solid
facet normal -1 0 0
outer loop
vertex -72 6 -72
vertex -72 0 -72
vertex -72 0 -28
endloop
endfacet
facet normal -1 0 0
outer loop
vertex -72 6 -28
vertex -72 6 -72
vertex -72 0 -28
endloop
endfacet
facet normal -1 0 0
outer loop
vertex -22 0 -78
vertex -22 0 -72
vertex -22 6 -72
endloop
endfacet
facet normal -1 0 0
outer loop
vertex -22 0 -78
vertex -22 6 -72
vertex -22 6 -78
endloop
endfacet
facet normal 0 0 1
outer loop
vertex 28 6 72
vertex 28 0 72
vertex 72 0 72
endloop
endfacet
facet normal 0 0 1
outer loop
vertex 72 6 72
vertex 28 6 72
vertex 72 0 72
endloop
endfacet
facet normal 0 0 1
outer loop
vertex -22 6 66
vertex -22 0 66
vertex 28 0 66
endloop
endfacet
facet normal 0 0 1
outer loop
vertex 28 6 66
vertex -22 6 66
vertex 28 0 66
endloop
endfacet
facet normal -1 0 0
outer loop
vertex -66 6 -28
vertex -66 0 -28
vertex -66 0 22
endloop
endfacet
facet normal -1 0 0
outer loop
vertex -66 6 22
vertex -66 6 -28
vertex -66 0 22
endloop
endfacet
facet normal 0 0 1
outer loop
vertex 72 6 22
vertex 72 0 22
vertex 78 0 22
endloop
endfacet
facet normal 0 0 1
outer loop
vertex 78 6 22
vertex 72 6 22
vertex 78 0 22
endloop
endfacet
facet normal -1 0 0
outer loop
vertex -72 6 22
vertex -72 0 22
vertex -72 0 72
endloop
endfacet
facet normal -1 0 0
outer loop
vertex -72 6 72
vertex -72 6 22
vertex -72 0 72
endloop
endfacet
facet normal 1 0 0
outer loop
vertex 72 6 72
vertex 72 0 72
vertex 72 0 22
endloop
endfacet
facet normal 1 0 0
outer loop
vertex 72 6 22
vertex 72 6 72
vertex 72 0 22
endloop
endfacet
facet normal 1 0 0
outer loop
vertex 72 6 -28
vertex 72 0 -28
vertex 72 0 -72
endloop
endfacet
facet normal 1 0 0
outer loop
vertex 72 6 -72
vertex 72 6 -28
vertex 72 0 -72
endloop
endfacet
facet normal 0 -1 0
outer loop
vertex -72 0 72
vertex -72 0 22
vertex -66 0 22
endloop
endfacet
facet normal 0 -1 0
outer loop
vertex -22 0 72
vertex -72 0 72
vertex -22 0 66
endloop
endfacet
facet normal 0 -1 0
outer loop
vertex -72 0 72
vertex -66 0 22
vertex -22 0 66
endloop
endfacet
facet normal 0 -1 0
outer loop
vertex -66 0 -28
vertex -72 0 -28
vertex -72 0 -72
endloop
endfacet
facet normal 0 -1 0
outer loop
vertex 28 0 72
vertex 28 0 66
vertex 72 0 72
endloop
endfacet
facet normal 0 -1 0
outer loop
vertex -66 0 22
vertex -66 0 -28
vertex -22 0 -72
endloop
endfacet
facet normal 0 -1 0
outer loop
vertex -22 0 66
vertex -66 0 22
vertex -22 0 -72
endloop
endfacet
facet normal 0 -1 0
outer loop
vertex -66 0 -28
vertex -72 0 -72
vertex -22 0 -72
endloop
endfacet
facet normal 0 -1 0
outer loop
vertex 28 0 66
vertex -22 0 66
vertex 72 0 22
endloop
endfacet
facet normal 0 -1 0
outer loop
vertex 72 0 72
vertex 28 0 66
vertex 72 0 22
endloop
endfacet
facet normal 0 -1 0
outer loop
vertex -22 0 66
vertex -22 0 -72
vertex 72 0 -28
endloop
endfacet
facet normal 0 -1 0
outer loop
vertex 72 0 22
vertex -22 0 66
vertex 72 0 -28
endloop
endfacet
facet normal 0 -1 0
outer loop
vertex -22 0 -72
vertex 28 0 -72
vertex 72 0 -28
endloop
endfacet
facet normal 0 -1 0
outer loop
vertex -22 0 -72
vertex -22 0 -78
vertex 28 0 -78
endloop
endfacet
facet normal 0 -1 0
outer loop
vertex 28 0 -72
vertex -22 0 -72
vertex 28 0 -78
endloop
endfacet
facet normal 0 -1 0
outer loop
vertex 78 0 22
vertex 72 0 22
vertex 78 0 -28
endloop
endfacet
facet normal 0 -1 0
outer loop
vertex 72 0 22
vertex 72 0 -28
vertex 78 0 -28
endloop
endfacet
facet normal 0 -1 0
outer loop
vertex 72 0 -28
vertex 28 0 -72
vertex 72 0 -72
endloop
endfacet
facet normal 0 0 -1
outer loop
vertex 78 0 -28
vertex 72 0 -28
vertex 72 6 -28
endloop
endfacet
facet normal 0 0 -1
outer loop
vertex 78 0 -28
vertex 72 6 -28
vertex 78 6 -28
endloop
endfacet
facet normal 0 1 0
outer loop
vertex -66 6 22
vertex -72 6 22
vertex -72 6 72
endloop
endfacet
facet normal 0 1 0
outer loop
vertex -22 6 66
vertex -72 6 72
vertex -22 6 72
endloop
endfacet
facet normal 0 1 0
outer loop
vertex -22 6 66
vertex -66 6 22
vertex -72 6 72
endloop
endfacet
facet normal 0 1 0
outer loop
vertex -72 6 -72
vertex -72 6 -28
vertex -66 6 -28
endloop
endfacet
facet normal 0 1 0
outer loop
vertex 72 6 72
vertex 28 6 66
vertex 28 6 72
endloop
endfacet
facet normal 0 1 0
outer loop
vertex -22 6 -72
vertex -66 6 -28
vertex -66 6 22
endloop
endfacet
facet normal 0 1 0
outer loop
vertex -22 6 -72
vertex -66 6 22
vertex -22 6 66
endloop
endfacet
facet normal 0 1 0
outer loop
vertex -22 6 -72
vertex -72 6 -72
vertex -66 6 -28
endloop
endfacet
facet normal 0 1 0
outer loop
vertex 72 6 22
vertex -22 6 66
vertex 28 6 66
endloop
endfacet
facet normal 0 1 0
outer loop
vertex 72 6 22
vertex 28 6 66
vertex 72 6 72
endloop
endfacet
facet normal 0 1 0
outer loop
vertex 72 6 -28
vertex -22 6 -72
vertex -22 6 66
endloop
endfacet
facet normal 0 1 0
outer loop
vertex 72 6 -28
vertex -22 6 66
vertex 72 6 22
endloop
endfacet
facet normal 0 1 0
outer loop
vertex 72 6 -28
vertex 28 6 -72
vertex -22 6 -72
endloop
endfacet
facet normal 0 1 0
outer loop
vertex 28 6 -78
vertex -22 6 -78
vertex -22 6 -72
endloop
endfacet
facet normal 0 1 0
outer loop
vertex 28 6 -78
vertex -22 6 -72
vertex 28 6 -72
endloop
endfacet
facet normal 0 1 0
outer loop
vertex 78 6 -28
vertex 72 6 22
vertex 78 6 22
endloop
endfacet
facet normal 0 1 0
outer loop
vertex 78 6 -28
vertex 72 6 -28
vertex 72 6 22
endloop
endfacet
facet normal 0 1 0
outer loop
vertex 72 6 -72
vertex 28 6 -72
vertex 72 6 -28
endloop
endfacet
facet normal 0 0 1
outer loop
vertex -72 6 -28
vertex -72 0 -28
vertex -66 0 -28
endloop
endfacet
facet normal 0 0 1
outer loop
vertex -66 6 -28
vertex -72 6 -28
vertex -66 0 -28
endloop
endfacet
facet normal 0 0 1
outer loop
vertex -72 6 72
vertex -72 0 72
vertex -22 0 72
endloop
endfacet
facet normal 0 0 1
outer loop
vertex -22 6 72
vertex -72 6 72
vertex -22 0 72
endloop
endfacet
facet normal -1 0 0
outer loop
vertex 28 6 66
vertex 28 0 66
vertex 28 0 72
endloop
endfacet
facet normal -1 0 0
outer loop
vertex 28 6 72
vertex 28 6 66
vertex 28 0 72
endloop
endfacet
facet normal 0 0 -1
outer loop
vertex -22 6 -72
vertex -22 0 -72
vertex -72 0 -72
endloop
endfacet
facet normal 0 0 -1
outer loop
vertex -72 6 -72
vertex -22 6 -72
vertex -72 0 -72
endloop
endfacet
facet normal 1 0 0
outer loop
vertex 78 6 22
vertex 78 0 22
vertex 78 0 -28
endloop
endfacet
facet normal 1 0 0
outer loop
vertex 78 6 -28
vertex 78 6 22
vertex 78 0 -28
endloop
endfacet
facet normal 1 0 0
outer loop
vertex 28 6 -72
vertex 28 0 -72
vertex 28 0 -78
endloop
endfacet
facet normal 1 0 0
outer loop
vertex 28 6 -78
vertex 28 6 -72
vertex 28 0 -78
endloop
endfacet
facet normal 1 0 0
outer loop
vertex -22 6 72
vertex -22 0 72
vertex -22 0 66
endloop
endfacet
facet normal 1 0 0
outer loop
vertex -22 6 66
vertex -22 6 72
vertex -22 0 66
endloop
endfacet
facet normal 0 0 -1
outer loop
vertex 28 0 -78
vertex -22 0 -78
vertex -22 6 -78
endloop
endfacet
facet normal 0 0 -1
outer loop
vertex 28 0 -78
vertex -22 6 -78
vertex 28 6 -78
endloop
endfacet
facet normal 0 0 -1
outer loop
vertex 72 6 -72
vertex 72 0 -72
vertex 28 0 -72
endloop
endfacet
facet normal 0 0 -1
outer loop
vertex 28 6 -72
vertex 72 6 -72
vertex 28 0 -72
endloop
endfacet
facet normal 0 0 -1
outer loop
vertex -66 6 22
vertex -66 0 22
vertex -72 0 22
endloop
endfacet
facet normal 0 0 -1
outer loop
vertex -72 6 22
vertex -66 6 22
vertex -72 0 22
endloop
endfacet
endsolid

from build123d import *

# Parameters (mm, degrees)
SKETCH1_W           = 50
SKETCH1_H           = 6
SKETCH1_W_2         = 6
SKETCH1_H_2         = 50
BOSS_EXTRUDE1_DEPTH = 6


with BuildPart() as part:
    # Sketch1 → Boss-Extrude1 (new body)
    with BuildSketch(Plane(origin=(0, 0, 0), x_dir=(1, 0, 0), z_dir=(0, 1, 0))):
        Polygon((-72, 72), (-72, 28), (-66, 28), (-66, -22), (-72, -22), (-72, -72), (-22, -72), (-22, -66), (28, -66), (28, -72), (72, -72), (72, -22), (72, 28), (72, 72), (28, 72), (-22, 72), align=None)
        with Locations((3, 75)):
            Rectangle(SKETCH1_W, SKETCH1_H)
        with Locations((75, 3)):
            Rectangle(SKETCH1_W_2, SKETCH1_H_2)
    extrude(amount=BOSS_EXTRUDE1_DEPTH)


solid = part.part
